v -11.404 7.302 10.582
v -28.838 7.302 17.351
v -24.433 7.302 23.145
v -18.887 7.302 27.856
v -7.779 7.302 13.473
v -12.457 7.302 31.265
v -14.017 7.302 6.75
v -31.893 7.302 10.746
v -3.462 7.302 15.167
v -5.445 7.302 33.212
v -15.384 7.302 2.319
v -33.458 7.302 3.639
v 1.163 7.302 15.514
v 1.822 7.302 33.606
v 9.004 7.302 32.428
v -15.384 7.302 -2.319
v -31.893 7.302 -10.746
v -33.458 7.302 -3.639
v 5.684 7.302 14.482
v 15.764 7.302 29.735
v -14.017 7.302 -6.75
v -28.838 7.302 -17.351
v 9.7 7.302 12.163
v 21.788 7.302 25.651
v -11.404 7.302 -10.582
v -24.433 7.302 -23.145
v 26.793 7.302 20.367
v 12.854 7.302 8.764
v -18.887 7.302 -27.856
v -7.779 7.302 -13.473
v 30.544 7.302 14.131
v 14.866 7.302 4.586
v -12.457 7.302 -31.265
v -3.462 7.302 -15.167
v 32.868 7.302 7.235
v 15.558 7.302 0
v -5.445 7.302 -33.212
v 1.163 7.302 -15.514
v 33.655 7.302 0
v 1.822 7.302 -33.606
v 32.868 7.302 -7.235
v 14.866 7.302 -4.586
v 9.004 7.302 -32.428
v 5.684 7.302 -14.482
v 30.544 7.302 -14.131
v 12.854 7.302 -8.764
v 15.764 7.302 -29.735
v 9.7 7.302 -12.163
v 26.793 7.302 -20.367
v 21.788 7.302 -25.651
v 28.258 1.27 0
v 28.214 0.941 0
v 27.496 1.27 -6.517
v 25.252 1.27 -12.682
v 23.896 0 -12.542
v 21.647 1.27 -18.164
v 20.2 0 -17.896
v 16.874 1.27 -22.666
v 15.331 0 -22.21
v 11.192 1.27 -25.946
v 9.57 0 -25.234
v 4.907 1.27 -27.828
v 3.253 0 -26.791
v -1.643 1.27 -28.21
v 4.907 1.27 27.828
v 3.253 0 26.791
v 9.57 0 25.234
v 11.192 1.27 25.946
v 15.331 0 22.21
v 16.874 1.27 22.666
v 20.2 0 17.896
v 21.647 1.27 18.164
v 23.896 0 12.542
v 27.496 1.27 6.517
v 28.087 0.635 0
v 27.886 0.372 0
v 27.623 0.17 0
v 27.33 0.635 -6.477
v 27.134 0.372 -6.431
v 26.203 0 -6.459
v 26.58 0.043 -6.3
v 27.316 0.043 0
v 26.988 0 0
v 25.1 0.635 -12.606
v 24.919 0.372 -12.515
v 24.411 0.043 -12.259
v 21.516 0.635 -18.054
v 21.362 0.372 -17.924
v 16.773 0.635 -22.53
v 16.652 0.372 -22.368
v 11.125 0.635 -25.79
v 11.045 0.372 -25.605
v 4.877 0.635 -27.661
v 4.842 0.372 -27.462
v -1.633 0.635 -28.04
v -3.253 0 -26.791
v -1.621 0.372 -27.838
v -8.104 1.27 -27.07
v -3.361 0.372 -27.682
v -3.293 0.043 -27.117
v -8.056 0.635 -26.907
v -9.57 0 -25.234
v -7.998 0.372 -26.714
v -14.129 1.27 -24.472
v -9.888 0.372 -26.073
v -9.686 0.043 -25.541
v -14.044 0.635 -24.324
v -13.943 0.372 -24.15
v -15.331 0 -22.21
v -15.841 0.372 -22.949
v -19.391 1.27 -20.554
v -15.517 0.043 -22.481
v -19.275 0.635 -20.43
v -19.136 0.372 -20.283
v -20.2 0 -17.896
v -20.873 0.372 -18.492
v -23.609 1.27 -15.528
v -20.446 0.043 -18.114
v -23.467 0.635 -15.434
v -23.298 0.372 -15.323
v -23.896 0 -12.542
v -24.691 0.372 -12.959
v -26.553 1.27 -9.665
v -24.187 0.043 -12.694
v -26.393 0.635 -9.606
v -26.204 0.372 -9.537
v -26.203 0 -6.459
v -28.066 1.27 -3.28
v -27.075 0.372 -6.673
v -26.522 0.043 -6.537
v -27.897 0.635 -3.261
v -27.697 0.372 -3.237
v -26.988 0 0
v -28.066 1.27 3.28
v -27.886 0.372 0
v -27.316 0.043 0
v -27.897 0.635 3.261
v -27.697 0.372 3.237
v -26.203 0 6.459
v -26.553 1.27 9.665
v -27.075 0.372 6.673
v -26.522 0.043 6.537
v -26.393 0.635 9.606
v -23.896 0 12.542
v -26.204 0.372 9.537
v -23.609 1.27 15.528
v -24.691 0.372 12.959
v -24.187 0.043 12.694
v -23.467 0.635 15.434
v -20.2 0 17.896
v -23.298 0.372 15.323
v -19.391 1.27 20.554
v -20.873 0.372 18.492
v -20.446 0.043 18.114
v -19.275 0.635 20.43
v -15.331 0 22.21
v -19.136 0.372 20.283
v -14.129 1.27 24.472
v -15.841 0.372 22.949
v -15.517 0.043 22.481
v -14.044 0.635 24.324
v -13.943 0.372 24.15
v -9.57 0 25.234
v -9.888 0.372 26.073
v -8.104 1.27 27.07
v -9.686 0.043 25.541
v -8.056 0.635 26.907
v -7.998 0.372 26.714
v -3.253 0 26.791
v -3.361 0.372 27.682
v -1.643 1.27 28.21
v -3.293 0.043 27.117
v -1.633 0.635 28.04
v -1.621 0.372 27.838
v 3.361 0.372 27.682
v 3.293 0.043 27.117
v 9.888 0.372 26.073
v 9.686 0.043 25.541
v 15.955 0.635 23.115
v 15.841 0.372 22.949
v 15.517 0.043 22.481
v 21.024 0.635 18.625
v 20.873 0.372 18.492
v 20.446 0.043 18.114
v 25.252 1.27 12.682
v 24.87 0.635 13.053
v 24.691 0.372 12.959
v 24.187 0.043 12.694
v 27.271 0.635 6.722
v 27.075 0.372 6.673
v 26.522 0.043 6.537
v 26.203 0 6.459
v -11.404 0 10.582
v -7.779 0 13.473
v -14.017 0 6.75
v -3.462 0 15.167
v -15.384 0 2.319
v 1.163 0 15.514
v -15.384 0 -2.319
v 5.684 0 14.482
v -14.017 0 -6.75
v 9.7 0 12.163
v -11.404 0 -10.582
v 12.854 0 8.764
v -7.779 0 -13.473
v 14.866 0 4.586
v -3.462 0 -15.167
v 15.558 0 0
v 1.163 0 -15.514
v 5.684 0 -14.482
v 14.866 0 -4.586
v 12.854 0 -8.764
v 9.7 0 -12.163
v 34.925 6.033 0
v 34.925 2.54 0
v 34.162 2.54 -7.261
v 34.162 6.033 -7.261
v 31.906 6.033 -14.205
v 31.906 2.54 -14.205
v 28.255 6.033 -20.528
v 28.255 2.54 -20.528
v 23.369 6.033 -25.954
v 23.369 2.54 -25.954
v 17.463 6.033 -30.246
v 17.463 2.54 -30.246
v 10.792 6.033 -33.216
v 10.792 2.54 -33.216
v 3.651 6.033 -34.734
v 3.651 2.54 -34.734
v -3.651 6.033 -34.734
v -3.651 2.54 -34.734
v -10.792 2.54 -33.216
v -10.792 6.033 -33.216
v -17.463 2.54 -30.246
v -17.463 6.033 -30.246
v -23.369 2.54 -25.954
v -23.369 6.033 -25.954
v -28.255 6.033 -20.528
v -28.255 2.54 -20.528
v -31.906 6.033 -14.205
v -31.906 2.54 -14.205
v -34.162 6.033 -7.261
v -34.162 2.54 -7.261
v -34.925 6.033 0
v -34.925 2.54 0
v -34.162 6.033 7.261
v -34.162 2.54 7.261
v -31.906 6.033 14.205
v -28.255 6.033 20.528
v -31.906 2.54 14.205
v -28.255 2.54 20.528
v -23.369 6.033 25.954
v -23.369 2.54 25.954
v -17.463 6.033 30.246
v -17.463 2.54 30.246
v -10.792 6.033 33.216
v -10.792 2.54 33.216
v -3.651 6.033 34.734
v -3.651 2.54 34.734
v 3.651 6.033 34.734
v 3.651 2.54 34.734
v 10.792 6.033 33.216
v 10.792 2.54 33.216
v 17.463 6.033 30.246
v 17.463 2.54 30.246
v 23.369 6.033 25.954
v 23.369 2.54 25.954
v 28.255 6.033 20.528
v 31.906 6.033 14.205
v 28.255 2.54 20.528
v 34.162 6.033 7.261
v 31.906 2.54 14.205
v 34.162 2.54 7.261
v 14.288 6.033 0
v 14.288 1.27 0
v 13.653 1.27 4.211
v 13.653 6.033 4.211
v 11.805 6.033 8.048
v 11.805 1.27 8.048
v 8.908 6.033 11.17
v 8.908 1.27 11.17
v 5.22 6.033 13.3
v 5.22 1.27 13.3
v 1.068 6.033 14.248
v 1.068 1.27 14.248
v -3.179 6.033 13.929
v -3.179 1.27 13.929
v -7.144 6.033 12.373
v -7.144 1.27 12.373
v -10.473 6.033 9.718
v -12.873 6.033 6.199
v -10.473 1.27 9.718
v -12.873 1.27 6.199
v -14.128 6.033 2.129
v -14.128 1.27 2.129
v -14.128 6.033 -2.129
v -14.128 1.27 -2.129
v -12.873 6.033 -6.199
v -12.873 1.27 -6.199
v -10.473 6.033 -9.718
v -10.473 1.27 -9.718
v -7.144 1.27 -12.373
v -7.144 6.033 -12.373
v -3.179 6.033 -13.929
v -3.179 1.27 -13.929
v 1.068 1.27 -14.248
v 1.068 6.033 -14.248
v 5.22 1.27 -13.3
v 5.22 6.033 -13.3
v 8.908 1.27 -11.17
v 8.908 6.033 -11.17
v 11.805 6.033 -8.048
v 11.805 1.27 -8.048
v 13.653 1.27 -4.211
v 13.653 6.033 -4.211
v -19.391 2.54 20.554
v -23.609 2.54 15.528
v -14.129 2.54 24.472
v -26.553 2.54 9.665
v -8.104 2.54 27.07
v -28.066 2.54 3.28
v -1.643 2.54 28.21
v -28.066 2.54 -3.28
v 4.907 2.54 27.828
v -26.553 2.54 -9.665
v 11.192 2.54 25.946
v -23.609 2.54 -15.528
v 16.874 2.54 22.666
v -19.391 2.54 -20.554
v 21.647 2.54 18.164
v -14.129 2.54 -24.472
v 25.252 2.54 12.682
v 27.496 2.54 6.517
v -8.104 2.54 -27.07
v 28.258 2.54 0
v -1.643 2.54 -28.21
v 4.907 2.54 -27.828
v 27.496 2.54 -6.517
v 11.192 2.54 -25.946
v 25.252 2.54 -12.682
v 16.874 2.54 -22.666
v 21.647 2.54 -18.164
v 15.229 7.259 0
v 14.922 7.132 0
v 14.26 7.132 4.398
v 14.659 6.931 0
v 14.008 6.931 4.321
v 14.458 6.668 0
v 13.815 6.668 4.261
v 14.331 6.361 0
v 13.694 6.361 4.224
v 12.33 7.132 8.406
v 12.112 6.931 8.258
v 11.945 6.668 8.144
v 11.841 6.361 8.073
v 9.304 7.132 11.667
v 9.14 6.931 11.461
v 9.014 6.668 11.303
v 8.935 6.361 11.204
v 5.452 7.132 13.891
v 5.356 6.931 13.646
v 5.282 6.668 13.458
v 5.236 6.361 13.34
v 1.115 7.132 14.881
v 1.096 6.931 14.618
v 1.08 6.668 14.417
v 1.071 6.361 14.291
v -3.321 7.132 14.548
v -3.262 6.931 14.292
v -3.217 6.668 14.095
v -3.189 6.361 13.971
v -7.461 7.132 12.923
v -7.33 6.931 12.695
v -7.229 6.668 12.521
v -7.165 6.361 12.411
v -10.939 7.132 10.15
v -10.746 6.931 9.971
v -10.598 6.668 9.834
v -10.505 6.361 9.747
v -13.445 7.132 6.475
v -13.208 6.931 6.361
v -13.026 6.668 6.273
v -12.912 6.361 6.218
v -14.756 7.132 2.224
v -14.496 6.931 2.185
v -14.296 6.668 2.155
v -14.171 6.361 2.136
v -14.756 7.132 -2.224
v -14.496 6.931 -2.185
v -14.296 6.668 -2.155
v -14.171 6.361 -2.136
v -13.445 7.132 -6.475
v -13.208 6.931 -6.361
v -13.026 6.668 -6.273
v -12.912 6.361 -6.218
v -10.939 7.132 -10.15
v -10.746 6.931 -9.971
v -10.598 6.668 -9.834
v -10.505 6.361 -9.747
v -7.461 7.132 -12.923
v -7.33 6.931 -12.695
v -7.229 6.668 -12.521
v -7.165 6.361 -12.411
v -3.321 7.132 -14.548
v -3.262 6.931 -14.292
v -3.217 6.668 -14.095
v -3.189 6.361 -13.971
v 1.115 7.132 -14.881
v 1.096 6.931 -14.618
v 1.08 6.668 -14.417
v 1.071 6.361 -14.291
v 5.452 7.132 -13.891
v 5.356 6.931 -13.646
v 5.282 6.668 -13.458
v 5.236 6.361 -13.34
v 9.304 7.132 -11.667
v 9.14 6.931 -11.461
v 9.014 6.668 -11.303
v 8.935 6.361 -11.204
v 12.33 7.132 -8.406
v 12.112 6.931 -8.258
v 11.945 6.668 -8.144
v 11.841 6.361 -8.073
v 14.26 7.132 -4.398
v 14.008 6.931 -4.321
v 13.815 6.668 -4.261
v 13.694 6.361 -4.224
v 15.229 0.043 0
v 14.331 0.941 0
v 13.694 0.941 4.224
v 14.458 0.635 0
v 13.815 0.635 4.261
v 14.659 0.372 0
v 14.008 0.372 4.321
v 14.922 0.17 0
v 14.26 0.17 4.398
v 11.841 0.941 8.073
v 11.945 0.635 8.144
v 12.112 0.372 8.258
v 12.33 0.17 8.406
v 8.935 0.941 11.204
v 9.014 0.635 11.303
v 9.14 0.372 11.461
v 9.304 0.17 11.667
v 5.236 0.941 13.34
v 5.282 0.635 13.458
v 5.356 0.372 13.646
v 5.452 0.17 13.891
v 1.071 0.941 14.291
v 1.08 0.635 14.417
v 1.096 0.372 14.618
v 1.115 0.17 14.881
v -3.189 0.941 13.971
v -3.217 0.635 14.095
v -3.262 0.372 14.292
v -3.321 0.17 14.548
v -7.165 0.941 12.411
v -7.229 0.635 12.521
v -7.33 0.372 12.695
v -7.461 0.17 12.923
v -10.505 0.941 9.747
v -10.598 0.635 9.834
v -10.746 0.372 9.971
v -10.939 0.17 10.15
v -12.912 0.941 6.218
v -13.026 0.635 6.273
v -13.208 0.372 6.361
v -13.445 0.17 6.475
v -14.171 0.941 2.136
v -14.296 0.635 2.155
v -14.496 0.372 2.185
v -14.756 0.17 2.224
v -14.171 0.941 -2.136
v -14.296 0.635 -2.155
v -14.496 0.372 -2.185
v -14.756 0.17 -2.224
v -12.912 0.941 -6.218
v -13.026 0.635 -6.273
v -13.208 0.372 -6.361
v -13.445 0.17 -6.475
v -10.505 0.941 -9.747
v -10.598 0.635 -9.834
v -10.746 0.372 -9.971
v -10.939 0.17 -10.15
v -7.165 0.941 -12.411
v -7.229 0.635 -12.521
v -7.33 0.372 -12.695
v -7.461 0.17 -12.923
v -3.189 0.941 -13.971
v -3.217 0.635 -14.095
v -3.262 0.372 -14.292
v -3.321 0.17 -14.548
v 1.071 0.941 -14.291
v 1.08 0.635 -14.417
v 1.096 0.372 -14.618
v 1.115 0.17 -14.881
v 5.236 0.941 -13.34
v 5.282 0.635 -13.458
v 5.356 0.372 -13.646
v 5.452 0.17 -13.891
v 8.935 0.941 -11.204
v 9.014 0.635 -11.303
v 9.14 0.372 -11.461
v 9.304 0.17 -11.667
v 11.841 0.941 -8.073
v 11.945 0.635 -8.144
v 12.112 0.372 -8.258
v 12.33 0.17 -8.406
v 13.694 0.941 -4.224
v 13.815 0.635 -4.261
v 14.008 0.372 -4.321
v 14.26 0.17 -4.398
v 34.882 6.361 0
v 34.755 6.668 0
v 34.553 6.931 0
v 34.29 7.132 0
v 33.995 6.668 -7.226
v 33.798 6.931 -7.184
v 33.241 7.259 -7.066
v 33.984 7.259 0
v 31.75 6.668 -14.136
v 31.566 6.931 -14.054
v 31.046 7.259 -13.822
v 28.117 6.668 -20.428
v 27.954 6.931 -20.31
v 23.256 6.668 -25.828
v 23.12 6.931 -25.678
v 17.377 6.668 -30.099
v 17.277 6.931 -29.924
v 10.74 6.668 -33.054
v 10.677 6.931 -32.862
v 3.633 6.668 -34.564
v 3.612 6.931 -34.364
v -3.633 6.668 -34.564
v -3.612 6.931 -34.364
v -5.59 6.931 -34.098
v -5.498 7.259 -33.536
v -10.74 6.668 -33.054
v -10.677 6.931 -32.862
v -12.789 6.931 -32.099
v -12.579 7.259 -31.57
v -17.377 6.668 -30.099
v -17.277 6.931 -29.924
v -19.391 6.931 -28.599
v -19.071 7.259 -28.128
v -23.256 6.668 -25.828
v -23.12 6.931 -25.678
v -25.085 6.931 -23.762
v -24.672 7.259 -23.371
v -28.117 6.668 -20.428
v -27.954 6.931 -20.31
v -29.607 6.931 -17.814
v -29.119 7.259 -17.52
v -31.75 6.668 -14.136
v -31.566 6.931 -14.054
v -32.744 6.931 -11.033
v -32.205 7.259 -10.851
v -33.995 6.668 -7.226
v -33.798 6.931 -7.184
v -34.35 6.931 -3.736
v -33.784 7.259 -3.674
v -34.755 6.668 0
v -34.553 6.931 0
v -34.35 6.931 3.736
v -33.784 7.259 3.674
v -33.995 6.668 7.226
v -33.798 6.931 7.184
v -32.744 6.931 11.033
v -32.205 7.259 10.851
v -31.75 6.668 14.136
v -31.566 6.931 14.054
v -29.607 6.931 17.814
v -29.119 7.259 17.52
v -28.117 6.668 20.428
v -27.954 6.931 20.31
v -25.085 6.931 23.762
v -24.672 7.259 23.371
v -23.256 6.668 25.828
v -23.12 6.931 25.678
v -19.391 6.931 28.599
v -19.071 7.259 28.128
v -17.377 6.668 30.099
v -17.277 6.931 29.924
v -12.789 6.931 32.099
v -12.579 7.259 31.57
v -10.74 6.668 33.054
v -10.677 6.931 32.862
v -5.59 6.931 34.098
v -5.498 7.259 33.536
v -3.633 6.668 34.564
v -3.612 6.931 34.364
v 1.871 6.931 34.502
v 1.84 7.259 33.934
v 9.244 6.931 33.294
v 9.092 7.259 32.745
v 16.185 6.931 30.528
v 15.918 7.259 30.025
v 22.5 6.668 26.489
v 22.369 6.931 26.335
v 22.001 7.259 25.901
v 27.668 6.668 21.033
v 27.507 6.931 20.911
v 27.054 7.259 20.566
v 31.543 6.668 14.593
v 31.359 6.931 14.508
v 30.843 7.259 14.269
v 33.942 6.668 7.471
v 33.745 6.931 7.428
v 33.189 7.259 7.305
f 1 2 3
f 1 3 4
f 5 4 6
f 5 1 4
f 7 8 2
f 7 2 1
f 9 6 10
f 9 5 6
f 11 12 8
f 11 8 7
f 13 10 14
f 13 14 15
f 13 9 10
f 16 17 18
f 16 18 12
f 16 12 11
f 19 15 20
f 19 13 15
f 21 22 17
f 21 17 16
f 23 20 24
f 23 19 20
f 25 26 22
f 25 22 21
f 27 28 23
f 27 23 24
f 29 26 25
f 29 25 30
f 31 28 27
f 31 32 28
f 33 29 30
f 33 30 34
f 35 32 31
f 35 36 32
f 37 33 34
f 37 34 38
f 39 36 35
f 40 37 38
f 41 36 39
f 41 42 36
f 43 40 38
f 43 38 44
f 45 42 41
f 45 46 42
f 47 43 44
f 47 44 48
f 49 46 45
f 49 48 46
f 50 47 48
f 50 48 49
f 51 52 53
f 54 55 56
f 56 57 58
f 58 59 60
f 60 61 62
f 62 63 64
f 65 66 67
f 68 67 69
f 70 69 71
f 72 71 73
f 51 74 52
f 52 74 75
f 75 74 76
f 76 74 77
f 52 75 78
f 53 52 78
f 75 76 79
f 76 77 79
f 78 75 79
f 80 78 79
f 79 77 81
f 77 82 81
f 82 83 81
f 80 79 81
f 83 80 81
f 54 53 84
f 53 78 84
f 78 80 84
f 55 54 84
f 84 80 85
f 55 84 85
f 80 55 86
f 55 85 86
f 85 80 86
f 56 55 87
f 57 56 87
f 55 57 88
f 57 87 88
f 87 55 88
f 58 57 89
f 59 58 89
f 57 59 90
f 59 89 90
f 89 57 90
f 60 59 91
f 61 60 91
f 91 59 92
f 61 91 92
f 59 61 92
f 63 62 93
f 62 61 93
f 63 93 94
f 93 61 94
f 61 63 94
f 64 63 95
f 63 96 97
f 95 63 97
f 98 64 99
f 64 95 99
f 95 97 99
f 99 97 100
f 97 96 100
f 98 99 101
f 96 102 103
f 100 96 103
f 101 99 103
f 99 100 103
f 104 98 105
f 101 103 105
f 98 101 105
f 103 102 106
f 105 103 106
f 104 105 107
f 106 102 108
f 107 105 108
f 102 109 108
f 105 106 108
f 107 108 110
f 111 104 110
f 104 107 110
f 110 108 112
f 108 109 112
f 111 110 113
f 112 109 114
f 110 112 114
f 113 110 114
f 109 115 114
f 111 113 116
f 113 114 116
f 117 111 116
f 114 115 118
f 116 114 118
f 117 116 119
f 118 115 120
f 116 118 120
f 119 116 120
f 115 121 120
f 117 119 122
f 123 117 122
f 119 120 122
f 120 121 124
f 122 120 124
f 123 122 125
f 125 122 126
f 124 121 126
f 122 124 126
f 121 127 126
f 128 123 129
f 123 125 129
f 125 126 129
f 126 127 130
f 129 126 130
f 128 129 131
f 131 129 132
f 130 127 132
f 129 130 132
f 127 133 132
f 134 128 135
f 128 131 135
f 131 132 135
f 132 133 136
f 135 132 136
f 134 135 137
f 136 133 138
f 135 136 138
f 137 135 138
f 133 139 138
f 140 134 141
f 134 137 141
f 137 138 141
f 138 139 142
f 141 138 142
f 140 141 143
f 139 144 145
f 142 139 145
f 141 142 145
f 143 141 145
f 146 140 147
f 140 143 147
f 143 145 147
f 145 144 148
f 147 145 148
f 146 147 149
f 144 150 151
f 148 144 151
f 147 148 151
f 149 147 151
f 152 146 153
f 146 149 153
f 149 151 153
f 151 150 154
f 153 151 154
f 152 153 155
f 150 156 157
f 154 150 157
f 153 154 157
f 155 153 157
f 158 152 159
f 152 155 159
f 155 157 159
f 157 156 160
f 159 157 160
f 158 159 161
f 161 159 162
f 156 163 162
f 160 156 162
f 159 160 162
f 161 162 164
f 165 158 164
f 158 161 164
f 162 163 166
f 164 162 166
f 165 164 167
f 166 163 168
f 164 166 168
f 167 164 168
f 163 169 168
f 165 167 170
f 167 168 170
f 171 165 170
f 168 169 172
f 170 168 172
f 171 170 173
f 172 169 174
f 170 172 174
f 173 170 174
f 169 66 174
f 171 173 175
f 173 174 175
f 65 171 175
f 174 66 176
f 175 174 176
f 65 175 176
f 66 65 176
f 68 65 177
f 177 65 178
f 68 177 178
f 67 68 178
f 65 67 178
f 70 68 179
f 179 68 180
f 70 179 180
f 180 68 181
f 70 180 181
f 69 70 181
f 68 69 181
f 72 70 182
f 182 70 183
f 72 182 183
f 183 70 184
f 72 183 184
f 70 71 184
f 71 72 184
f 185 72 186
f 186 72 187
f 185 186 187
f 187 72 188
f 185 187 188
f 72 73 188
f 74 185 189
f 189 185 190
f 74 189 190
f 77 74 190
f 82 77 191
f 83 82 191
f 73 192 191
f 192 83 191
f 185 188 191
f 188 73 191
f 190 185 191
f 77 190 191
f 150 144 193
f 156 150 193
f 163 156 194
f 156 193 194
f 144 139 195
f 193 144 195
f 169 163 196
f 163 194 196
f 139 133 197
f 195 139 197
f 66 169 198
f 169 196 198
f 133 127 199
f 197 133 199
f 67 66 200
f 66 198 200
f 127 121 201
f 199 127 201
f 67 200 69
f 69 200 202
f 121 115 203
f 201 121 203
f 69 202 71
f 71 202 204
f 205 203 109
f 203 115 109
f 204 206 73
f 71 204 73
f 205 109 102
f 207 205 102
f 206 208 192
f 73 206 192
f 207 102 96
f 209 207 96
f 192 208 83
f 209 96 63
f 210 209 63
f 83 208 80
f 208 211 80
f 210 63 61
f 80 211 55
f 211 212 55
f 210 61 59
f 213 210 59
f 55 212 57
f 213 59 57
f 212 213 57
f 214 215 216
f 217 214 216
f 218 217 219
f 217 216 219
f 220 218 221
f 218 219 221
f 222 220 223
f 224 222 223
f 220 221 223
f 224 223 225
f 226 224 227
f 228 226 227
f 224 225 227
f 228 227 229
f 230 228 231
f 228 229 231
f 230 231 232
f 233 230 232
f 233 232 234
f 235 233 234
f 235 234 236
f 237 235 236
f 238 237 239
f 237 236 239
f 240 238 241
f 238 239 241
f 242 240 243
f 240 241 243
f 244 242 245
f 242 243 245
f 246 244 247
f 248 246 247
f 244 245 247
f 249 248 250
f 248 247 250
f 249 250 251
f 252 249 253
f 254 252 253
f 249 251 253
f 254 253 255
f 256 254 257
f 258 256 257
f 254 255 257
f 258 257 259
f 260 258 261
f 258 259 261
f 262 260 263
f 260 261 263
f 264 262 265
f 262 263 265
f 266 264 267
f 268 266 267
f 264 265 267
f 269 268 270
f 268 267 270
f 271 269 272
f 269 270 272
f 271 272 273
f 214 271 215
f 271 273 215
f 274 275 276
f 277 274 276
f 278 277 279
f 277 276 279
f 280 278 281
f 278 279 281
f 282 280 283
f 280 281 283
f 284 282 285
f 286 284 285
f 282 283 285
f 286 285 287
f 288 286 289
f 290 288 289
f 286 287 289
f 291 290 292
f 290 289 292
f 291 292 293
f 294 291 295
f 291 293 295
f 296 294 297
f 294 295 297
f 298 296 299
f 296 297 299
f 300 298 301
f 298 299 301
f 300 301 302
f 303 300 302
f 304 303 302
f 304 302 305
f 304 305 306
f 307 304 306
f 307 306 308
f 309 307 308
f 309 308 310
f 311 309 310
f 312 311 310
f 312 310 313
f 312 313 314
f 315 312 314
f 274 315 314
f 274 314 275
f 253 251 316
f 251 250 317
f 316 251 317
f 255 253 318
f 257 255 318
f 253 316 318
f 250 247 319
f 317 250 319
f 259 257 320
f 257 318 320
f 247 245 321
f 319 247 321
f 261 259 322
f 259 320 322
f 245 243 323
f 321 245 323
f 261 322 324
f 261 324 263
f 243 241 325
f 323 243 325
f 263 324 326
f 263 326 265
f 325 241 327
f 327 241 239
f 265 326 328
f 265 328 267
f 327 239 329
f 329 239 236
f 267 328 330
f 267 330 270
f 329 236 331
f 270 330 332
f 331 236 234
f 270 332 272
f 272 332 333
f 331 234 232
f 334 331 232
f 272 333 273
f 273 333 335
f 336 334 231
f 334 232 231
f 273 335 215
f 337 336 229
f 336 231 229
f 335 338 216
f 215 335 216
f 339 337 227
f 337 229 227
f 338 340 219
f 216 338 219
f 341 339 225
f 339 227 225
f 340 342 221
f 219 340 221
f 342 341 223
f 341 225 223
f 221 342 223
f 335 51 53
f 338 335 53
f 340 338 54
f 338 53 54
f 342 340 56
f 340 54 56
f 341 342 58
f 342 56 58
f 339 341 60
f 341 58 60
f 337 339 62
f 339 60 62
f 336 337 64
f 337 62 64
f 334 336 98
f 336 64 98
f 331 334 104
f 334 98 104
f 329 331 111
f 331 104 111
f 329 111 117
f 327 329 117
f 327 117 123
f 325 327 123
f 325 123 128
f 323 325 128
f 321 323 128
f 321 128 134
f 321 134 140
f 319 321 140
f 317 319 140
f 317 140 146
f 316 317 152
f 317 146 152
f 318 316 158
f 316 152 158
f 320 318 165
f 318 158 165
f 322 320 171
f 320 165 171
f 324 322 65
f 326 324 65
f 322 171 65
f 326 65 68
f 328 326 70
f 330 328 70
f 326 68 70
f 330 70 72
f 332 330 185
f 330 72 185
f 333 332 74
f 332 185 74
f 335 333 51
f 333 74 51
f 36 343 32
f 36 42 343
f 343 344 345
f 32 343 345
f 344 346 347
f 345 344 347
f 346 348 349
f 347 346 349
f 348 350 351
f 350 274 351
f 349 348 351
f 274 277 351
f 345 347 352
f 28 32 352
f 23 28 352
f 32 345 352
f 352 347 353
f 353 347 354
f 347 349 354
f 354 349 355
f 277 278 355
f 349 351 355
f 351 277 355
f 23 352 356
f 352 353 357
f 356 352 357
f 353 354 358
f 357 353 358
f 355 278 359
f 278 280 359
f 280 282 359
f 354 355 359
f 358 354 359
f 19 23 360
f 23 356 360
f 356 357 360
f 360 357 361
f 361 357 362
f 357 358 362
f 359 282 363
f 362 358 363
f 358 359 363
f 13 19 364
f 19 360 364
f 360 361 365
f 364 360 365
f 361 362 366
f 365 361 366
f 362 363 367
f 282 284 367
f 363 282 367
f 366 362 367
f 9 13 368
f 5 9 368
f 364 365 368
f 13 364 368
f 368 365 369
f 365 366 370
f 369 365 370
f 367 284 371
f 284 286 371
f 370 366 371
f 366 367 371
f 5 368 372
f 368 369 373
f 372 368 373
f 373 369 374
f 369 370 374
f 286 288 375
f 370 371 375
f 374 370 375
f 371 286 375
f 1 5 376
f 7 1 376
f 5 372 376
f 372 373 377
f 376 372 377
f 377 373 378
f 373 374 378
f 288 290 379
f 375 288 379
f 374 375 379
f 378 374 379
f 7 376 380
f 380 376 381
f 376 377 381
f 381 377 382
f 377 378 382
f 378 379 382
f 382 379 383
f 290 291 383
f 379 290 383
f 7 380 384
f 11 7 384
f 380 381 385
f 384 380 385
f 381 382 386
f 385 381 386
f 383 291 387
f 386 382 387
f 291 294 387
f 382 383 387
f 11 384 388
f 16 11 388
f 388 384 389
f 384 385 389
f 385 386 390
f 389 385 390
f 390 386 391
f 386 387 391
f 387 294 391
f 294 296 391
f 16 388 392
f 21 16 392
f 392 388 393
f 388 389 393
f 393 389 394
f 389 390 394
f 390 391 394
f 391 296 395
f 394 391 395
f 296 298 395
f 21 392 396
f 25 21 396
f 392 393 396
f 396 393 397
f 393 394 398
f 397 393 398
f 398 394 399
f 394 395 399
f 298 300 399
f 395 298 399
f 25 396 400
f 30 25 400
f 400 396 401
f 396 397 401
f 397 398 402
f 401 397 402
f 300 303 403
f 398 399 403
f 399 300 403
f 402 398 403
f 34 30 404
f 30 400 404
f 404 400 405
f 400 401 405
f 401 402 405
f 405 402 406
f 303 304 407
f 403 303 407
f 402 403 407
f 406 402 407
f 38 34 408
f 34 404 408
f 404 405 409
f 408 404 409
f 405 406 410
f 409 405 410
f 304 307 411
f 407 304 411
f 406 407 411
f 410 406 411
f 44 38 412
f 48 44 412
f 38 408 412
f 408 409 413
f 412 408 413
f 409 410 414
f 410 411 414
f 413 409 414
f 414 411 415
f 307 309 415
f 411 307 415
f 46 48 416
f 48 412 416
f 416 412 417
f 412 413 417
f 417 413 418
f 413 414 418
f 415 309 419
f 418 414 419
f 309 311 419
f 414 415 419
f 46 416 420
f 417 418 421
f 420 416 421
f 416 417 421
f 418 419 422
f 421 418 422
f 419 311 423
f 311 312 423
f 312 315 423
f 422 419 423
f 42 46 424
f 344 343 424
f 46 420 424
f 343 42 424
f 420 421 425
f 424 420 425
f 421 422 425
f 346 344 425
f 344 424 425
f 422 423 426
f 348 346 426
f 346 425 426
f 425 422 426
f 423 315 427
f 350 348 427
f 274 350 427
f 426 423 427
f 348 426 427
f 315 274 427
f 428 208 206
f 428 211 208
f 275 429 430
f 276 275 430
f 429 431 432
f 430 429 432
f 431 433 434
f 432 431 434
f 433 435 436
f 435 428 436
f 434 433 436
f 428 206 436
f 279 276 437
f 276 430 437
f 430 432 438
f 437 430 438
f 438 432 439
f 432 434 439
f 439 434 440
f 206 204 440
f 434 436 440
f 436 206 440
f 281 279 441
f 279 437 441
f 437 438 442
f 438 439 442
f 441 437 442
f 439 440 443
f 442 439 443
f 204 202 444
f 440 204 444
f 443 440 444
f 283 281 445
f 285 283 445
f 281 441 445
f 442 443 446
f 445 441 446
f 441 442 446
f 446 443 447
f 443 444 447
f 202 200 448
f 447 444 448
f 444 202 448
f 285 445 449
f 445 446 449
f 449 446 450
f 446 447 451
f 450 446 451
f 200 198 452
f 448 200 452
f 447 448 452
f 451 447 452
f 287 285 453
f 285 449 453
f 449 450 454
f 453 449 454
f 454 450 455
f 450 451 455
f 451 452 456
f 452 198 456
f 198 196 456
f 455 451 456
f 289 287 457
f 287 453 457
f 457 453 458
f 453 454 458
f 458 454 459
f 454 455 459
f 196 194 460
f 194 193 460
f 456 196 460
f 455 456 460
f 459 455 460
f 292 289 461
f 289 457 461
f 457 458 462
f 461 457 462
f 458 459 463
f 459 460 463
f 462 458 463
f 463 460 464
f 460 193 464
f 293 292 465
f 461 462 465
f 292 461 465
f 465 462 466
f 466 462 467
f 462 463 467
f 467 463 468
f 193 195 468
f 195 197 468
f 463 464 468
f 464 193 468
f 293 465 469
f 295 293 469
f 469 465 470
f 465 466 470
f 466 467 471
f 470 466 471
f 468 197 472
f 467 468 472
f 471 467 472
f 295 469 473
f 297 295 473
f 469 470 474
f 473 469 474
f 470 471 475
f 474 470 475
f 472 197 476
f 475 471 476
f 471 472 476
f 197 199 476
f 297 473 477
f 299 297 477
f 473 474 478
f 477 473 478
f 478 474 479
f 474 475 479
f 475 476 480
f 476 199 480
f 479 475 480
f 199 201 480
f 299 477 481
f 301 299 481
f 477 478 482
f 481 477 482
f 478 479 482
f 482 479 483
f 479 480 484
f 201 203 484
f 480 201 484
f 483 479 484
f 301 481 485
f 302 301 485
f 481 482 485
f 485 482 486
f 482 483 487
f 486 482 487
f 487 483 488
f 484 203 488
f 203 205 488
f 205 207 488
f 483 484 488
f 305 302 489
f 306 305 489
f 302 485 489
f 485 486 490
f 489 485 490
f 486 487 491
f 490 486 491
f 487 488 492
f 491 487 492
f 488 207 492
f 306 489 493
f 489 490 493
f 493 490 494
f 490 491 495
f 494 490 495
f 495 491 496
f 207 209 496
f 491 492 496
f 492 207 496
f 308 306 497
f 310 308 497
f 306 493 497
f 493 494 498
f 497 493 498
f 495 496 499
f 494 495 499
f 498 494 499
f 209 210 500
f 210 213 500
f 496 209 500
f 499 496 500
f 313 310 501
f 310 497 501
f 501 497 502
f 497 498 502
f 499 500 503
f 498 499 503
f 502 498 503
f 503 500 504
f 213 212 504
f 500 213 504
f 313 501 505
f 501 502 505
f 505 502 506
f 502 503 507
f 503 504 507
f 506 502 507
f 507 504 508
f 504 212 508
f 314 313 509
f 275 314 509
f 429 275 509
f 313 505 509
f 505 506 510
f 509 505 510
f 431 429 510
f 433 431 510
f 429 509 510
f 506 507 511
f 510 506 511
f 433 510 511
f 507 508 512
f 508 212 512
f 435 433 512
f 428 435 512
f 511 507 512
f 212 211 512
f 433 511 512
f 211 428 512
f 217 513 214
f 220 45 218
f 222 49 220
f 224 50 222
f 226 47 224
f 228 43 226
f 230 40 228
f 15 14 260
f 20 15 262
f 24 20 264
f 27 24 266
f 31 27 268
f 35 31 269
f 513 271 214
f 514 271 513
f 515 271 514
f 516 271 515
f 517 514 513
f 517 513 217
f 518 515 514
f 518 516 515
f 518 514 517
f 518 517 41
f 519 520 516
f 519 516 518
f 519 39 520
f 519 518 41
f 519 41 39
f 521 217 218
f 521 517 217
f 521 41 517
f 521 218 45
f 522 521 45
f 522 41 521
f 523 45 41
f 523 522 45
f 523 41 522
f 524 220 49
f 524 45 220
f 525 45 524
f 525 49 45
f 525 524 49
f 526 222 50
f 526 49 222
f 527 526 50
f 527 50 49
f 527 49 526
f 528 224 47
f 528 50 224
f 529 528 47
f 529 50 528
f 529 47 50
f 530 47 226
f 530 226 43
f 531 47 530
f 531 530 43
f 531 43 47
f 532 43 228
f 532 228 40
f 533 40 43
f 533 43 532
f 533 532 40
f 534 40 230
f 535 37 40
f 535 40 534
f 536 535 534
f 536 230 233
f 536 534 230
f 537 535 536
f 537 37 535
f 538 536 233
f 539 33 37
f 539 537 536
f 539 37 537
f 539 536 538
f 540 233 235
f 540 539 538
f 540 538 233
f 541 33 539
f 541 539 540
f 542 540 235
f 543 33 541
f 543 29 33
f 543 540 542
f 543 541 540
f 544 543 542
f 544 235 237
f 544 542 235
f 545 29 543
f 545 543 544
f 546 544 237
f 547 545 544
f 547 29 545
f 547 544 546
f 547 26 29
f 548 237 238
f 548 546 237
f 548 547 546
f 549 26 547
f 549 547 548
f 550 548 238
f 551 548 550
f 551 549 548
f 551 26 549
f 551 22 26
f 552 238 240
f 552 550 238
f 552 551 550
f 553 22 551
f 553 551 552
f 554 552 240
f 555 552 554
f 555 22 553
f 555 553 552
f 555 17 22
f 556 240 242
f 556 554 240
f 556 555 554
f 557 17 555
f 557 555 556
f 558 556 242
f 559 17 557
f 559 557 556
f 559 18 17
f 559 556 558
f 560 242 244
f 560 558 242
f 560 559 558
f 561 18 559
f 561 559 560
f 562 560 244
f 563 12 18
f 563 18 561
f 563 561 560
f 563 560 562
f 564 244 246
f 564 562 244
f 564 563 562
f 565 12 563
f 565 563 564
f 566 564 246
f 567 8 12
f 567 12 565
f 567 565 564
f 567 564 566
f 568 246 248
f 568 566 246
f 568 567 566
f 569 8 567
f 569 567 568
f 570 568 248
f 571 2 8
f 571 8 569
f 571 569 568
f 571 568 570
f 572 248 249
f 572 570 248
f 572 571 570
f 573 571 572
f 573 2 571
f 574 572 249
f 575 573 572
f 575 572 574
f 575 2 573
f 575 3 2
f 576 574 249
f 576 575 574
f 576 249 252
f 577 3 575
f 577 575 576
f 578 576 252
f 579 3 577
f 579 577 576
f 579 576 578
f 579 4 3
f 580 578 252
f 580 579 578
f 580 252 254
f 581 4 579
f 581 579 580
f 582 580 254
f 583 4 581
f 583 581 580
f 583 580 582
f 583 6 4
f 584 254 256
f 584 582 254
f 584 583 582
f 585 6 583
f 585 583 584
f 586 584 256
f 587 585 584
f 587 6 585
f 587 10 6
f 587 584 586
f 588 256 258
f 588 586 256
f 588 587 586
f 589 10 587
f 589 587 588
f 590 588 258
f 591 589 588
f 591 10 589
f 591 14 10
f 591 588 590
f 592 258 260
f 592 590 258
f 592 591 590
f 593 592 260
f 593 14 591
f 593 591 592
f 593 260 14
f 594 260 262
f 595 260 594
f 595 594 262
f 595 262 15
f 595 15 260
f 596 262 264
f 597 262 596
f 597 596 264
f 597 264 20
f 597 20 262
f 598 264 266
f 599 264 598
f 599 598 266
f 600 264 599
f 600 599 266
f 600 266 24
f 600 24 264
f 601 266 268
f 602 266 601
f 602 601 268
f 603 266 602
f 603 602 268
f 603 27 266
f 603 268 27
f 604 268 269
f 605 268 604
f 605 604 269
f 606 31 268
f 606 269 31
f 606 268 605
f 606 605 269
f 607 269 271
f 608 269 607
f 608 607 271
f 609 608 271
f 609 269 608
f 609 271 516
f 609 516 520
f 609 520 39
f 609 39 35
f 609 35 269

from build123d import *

# Parameters (mm, degrees)
SKETCH1_R           = 28.2575
BOSS_EXTRUDE1_DEPTH = 2.54
SKETCH2_R           = 34.925
BOSS_EXTRUDE2_DEPTH = 4.7625
CUT_EXTRUDE1_REACH  = 9.303
SKETCH3_R           = 14.2875
FILLET1_R           = 1.27


with BuildPart() as part:
    # Sketch1 → Boss-Extrude1 (new body)
    with BuildSketch(Plane(origin=(0, 0, 0), x_dir=(1, 0, 0), z_dir=(0, 1, 0))):
        Circle(SKETCH1_R)
    extrude(amount=BOSS_EXTRUDE1_DEPTH)

    # Sketch2 → Boss-Extrude2 (add)
    with BuildSketch(Plane(origin=(0, 2.54, 0), x_dir=(1, 0, 0), z_dir=(0, 1, 0))):
        Circle(SKETCH2_R)
    extrude(amount=BOSS_EXTRUDE2_DEPTH)

    # Sketch3 → Cut-Extrude1 (cut, up to next)
    with BuildSketch(Plane.XZ, mode=Mode.PRIVATE) as cut_extrude1_sk1:
        Circle(SKETCH3_R)
    cut_extrude1_tool1 = extrude(cut_extrude1_sk1.sketch, amount=-CUT_EXTRUDE1_REACH, mode=Mode.PRIVATE) & part.part
    add(cut_extrude1_tool1.solids().sort_by_distance((0, 0, 0))[0], mode=Mode.SUBTRACT)

    # Fillet1
    fillet1_edges = [part.edges().sort_by_distance(p)[0] for p in [
        (-14.2875, 7.3025, 0),
        (-14.2875, 0, 0),
        (-28.2575, 0, 0),
        (-34.925, 7.3025, 0),
    ]]
    fillet(fillet1_edges, radius=FILLET1_R)


solid = part.part
